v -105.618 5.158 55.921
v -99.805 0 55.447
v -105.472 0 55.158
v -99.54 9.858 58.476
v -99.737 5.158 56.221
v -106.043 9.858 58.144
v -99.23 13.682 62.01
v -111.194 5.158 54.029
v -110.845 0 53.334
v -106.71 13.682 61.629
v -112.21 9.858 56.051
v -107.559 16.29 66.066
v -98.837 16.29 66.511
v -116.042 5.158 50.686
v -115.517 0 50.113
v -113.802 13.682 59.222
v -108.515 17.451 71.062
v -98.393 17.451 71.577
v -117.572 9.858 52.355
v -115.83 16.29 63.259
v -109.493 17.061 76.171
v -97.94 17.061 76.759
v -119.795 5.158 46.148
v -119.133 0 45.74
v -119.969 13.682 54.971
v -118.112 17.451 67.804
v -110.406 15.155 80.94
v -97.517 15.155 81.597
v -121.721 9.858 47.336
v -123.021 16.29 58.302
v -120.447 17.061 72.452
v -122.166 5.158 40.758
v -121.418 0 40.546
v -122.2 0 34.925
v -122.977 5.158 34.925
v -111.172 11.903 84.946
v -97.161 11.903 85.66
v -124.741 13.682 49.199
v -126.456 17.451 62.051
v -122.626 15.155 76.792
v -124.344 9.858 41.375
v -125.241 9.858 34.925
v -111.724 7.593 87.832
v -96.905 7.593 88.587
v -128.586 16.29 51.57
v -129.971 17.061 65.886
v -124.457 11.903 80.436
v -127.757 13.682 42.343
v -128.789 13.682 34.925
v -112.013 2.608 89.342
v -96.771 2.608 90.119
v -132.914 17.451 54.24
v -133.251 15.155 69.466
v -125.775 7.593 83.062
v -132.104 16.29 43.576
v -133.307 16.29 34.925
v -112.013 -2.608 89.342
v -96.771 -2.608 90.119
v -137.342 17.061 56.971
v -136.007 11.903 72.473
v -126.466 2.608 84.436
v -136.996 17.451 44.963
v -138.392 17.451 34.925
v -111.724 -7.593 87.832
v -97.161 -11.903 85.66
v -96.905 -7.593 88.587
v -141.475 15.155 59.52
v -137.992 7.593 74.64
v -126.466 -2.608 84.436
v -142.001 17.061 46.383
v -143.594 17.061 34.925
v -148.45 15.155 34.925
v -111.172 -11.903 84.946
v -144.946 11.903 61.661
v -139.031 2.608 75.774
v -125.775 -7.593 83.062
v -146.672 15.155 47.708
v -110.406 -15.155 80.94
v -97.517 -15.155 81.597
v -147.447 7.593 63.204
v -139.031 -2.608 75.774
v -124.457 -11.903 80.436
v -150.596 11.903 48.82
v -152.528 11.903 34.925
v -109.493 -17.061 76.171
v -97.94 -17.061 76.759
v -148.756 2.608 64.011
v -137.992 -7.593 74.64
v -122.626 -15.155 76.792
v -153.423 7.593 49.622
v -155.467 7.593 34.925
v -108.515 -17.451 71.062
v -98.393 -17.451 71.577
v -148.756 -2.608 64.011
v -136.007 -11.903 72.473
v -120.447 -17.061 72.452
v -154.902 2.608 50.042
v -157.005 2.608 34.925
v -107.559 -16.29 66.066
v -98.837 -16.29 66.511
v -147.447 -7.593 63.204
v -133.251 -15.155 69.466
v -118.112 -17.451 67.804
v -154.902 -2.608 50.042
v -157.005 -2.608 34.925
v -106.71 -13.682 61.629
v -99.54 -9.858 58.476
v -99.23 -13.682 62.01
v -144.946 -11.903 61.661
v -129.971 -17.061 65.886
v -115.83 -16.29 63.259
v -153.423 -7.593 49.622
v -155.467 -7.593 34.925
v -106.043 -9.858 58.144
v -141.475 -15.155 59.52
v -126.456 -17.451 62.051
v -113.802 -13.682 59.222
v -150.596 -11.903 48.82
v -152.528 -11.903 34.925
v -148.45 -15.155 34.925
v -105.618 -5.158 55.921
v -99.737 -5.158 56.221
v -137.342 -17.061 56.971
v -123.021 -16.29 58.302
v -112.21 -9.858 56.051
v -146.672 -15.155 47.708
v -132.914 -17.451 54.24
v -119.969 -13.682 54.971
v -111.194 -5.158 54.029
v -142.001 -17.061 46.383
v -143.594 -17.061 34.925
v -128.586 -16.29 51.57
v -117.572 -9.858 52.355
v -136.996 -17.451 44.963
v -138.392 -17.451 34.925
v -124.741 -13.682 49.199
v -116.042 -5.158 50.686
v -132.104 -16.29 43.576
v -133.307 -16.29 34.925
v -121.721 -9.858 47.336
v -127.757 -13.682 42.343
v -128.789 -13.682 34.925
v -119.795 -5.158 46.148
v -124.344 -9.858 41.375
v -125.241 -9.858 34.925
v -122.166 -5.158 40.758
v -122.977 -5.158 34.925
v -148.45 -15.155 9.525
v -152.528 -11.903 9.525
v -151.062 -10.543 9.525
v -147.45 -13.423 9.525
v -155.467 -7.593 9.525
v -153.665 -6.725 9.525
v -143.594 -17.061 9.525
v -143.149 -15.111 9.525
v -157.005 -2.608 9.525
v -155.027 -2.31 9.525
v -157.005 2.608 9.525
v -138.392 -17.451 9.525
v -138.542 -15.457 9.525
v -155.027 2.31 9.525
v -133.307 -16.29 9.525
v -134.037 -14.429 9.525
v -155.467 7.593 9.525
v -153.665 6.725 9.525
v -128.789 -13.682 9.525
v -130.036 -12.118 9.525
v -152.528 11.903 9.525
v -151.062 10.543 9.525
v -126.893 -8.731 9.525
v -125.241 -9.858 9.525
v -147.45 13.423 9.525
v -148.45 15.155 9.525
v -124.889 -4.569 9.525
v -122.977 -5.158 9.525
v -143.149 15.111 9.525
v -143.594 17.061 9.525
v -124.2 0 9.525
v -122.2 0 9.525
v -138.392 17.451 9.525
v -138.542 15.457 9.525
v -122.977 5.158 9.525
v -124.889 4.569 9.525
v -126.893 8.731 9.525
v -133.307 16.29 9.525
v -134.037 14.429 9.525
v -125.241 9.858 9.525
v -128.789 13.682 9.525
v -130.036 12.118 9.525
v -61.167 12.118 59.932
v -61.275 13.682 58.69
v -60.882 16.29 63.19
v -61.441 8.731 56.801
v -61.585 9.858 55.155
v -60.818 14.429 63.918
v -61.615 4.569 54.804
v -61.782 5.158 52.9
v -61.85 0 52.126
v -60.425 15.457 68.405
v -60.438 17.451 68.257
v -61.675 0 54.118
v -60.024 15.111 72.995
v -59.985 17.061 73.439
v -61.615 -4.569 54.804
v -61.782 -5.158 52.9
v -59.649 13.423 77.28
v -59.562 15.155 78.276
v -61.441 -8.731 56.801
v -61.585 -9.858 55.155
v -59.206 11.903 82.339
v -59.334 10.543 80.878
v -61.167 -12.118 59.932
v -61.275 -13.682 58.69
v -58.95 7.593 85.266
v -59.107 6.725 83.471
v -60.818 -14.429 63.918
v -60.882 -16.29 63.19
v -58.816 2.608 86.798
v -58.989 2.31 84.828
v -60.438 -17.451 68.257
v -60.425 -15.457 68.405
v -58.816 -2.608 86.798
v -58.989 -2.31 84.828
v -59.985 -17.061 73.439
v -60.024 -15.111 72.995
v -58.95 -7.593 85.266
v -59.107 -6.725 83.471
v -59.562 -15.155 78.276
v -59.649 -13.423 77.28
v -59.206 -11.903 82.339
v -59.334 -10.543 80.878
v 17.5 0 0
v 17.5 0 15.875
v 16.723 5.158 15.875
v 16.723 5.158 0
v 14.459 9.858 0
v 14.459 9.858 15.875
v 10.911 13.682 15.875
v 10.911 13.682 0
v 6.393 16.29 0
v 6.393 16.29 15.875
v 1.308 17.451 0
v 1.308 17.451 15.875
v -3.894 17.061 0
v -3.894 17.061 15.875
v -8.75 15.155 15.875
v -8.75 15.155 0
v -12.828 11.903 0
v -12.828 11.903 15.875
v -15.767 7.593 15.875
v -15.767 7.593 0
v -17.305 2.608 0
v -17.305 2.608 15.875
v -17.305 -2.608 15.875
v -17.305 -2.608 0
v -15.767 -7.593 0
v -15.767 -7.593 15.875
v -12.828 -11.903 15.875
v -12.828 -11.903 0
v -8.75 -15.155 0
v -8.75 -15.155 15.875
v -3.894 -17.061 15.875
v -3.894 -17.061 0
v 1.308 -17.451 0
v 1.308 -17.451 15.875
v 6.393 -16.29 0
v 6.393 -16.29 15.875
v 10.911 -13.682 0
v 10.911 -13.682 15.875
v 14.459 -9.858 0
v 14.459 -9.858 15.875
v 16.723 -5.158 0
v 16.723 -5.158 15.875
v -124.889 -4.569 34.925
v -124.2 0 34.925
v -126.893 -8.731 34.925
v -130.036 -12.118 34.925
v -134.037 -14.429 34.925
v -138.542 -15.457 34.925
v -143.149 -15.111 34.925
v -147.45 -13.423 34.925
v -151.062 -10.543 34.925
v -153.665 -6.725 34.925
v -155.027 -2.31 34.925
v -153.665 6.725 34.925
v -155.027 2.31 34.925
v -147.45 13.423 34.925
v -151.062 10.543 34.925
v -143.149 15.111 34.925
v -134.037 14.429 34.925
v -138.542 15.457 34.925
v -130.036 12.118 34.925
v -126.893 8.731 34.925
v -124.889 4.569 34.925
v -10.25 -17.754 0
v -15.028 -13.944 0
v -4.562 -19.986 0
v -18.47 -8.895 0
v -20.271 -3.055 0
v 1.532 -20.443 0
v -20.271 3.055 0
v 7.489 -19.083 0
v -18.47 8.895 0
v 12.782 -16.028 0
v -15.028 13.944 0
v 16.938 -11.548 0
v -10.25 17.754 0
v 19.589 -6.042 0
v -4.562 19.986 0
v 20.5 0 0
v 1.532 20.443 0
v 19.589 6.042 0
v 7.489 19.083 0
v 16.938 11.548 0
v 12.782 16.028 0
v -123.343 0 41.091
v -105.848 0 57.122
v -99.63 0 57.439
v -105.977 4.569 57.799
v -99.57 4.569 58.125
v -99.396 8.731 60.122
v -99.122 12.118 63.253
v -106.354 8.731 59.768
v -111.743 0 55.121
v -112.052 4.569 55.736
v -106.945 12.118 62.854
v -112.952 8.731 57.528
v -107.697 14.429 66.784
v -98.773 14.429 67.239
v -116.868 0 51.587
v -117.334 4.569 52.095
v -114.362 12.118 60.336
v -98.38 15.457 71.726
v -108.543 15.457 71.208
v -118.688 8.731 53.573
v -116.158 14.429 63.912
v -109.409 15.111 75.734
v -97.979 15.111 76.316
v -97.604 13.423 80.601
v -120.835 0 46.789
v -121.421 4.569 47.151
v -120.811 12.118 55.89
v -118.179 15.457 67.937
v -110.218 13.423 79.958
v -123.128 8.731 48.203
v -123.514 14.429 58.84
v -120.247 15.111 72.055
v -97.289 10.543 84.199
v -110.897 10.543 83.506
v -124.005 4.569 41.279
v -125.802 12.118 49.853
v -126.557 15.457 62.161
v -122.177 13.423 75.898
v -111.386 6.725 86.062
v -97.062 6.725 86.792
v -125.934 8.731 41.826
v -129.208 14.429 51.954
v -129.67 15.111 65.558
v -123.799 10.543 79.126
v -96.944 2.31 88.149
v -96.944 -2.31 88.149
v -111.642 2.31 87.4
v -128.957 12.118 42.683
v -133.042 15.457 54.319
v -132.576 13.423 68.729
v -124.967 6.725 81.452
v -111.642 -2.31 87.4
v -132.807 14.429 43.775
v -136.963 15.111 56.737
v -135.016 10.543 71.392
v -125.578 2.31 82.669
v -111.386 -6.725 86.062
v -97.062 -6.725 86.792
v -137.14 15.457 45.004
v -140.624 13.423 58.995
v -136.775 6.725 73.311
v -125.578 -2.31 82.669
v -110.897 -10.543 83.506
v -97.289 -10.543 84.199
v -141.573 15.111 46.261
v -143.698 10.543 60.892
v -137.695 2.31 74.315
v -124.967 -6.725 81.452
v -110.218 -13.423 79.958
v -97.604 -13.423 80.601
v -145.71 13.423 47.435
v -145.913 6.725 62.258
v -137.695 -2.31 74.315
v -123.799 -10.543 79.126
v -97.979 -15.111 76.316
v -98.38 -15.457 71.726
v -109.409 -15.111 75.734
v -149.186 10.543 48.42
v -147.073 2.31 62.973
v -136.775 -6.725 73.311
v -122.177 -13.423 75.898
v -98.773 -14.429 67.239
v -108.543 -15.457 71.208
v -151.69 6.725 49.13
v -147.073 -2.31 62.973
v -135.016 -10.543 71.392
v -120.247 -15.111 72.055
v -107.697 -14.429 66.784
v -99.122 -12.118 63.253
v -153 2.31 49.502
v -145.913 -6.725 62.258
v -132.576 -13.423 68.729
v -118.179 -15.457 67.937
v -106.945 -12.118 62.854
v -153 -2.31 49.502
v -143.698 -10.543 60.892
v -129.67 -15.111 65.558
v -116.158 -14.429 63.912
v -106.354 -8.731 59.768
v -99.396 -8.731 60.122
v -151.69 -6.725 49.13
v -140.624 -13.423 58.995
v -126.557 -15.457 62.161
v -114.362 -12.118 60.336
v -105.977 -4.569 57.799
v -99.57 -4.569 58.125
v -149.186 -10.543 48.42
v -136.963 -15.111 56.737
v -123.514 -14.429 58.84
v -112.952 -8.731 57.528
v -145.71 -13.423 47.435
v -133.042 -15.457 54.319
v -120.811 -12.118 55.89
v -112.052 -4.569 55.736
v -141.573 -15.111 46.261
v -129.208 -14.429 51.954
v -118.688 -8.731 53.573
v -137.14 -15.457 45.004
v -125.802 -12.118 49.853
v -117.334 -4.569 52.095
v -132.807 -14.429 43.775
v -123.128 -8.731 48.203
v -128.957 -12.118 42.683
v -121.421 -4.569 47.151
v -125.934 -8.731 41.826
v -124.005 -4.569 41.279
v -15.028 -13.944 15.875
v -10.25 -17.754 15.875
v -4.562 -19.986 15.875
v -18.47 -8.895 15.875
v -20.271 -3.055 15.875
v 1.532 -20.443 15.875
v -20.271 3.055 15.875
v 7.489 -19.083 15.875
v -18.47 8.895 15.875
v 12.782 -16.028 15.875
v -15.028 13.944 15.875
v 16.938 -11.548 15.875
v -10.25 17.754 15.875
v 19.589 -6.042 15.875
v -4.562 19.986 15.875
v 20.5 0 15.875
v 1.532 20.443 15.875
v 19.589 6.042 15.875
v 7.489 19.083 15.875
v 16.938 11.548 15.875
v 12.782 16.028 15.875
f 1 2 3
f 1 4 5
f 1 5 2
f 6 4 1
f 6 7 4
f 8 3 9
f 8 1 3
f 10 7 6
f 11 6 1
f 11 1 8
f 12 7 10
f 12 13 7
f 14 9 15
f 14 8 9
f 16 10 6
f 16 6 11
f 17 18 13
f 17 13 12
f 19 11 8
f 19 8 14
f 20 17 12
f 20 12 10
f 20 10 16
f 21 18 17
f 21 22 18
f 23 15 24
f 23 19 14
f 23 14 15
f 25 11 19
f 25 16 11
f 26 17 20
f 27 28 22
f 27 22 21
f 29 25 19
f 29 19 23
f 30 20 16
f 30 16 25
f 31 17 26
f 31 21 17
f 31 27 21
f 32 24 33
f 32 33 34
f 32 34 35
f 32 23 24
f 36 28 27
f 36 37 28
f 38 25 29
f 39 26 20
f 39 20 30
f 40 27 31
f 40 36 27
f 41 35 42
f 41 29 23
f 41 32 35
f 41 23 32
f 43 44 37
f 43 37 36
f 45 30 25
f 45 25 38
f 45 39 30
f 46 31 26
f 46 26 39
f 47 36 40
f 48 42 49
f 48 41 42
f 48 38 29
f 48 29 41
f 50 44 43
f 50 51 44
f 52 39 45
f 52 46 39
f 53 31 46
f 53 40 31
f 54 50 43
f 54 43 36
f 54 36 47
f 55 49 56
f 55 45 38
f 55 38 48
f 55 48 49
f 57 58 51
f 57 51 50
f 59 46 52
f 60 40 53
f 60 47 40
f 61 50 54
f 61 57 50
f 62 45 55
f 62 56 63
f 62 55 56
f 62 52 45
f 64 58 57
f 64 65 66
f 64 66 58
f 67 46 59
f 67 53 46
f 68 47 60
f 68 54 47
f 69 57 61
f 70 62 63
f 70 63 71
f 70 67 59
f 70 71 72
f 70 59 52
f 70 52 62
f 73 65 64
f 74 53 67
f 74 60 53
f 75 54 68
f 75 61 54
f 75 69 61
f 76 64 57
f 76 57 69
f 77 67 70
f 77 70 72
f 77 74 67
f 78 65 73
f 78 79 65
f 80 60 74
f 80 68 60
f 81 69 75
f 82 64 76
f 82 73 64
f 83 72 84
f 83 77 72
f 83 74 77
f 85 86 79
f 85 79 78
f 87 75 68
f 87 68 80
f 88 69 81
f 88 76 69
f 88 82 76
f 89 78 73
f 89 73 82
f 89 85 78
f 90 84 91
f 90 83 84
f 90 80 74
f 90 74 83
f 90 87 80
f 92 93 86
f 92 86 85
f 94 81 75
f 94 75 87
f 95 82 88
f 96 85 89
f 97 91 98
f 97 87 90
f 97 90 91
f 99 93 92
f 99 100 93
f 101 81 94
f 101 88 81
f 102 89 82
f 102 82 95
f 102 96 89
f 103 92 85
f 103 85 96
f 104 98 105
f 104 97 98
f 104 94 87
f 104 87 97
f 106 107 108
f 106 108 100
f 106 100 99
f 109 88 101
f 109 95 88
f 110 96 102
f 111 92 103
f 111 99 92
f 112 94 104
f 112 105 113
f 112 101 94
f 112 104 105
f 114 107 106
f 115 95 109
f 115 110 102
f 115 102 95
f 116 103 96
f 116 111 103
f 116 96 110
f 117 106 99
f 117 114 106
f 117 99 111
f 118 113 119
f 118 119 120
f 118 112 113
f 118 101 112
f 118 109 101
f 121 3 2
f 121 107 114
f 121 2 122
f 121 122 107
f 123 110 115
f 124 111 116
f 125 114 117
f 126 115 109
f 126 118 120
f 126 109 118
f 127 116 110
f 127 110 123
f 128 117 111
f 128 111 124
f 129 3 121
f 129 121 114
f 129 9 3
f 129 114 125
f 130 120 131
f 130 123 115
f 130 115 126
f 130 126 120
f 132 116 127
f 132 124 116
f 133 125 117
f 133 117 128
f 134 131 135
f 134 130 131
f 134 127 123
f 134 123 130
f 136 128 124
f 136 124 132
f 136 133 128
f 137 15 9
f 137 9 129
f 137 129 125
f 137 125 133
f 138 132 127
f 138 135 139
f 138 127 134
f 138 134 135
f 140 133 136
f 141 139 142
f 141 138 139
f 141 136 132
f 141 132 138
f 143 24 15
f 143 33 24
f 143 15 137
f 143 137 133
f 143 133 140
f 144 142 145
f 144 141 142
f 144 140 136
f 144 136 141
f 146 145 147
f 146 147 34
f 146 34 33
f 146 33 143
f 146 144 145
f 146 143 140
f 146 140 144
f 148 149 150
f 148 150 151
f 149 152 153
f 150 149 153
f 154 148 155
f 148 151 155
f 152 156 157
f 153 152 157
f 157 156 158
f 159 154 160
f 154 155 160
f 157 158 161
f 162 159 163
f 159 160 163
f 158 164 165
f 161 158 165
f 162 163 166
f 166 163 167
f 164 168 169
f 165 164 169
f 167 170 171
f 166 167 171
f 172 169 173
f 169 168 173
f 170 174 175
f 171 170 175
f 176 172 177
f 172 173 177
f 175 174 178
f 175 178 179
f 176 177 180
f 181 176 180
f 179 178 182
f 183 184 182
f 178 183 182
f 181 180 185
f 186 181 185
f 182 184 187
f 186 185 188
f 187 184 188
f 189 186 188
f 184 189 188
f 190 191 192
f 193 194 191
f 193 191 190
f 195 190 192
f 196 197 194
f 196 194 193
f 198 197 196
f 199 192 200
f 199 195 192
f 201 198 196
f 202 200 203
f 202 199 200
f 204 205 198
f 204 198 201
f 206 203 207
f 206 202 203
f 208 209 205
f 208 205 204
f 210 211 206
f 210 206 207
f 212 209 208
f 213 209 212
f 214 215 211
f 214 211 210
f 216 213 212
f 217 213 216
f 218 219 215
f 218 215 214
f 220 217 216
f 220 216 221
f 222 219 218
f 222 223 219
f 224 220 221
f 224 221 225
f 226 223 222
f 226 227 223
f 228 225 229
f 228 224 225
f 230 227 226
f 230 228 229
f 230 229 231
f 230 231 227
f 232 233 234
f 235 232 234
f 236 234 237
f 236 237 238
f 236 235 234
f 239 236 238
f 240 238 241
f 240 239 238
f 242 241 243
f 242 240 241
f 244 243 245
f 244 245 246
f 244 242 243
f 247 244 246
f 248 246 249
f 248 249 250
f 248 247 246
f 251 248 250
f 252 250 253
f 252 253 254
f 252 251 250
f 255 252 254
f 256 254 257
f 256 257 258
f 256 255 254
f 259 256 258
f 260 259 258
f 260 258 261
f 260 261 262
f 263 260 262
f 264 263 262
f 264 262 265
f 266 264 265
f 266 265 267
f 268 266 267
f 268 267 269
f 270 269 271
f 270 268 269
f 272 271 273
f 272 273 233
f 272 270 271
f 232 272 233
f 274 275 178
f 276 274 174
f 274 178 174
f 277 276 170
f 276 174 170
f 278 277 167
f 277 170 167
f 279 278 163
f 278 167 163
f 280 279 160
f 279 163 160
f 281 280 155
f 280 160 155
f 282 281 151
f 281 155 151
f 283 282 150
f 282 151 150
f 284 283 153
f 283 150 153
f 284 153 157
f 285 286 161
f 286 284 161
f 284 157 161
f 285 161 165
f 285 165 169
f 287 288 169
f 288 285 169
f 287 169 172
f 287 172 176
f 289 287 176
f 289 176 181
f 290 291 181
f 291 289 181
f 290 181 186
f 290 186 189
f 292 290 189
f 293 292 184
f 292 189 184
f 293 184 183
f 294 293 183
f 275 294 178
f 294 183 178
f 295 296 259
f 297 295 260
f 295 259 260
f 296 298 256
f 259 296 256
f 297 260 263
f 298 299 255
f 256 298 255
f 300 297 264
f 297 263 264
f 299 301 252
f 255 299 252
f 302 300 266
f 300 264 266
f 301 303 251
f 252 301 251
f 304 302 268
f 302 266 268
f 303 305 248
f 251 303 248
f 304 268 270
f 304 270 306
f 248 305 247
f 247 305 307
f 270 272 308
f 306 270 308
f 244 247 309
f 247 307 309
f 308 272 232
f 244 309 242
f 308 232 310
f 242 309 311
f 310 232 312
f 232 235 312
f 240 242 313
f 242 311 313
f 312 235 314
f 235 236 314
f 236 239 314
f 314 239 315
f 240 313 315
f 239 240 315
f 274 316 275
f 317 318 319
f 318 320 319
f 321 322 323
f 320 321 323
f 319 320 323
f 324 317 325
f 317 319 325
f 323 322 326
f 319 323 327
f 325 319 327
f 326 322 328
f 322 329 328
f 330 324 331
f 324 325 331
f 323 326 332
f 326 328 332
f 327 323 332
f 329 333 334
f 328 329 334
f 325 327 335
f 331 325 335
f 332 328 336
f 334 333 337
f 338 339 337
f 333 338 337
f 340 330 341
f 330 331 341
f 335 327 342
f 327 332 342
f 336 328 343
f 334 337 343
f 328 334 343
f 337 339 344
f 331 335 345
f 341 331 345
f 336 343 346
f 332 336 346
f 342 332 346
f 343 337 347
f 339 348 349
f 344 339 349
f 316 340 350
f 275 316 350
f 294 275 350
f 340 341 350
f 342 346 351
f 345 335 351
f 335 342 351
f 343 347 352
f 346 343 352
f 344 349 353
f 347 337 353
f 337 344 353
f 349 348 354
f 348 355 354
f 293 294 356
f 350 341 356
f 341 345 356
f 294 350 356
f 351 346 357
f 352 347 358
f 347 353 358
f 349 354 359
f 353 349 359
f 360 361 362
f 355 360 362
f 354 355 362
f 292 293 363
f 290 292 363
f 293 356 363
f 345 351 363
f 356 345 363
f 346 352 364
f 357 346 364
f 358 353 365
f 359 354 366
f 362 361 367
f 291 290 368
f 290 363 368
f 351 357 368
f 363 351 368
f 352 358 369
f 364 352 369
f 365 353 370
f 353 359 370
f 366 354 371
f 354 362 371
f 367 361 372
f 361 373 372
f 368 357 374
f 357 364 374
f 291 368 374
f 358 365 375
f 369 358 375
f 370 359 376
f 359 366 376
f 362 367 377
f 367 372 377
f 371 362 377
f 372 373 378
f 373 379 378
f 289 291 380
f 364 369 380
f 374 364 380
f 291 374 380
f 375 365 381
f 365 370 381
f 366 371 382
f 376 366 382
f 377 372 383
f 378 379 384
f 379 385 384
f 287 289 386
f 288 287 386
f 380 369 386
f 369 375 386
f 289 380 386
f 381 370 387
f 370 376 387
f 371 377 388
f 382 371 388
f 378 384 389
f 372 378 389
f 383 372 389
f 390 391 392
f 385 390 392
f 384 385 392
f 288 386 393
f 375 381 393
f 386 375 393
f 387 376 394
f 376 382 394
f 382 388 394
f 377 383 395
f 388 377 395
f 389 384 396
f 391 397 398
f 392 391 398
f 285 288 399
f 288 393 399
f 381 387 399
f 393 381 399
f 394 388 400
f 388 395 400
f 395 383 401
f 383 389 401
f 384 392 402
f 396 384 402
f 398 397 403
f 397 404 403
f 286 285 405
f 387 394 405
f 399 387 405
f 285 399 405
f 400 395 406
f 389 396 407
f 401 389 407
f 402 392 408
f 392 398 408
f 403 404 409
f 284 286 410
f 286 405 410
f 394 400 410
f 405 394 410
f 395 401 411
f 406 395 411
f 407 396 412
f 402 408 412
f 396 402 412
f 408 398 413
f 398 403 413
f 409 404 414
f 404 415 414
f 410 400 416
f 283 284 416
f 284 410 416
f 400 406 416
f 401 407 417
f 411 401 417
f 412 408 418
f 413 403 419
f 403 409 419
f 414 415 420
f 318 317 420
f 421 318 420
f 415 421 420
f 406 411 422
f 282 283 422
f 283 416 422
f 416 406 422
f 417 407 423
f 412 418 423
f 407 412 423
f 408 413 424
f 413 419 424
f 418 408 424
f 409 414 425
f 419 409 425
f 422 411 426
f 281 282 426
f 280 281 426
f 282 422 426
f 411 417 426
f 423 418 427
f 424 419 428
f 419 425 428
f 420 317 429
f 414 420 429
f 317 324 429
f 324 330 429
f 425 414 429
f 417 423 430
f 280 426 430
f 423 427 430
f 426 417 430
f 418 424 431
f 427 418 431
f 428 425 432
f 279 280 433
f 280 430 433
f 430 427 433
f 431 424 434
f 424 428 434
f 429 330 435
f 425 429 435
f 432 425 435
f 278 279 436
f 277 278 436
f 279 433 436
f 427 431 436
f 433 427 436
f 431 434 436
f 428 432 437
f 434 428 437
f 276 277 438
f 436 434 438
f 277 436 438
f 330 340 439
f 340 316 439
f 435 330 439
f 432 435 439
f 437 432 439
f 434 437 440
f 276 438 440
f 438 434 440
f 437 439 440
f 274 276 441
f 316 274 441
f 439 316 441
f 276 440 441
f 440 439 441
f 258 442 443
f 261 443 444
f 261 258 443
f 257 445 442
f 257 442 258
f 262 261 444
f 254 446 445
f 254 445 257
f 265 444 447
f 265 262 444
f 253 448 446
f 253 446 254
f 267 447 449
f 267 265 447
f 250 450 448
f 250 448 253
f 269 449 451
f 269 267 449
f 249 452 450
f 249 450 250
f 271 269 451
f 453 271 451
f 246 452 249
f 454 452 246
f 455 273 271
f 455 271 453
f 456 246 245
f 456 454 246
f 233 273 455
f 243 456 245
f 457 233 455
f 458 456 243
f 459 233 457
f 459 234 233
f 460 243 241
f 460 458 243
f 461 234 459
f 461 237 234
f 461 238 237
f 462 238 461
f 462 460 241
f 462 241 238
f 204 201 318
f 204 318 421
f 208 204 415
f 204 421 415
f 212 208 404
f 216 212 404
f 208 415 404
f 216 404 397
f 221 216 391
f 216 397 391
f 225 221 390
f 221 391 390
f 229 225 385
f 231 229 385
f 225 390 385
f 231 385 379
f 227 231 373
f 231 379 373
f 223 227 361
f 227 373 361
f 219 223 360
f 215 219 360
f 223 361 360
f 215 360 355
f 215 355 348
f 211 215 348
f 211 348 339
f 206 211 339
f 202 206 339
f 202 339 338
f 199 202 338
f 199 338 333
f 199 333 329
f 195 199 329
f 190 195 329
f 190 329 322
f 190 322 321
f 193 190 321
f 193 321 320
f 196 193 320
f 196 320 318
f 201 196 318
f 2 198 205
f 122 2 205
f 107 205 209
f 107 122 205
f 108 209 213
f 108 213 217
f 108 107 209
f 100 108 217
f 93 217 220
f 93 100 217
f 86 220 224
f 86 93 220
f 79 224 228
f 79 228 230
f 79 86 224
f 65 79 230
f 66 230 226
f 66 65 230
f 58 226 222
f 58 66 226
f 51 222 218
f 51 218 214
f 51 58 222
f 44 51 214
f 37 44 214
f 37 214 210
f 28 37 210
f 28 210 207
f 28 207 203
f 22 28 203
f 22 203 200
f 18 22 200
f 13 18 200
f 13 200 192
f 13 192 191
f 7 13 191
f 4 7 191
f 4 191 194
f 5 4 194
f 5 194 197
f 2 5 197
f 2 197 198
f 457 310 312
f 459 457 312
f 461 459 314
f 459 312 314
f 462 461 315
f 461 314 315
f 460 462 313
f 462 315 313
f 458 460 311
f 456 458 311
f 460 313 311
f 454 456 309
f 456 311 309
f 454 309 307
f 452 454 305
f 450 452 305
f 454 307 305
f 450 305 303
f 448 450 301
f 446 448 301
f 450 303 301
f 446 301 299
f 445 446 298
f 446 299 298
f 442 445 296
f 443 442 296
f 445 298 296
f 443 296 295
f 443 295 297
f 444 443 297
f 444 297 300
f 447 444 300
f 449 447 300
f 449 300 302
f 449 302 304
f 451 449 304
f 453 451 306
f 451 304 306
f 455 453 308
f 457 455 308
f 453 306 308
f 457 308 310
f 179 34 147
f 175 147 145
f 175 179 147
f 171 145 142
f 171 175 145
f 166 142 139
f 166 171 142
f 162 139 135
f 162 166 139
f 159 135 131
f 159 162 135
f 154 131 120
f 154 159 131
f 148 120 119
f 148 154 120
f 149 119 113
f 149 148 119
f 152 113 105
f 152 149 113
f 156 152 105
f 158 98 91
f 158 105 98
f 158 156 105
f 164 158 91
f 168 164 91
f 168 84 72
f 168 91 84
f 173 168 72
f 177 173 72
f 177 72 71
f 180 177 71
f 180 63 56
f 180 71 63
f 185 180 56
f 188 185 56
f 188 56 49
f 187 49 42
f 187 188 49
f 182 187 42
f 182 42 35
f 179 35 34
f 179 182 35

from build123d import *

# Parameters (mm, degrees)
SKETCH1_R           = 20.5
SKETCH1_R_2         = 17.5
BOSS_EXTRUDE1_DEPTH = 15.875
SKETCH4_R           = 17.5
SKETCH4_R_2         = 15.5


with BuildPart() as part:
    # Sketch1 → Boss-Extrude1 (new body)
    with BuildSketch(Plane.XY):
        Circle(SKETCH1_R)
        Circle(SKETCH1_R_2, mode=Mode.SUBTRACT)
    extrude(amount=BOSS_EXTRUDE1_DEPTH)


with BuildPart() as body_2:
    # Sweep1: sweep along a path in Sketch5
    with BuildLine(Plane(origin=(0, 0, 0), x_dir=(1, 0, 0), z_dir=(0, 1, 0))) as sweep1_path:
        Line((-60.324348204, -69.559384199), (-98.279366201, -72.880017997))
        ThreePointArc((-98.279366201, -72.880017997), (-127.33998691, -63.015266532), (-139.7, -34.925))
        Line((-139.7, -34.925), (-139.7, -9.525))
    # Sketch4 → Sweep1 (sweep)
    with BuildSketch(Plane.XY.offset(9.525)):
        with Locations((-139.7, 0)):
            Circle(SKETCH4_R)
        with Locations((-139.7, 0)):
            Circle(SKETCH4_R_2, mode=Mode.SUBTRACT)
    sweep(path=sweep1_path.line)


solid = Compound([part.part, body_2.part])
